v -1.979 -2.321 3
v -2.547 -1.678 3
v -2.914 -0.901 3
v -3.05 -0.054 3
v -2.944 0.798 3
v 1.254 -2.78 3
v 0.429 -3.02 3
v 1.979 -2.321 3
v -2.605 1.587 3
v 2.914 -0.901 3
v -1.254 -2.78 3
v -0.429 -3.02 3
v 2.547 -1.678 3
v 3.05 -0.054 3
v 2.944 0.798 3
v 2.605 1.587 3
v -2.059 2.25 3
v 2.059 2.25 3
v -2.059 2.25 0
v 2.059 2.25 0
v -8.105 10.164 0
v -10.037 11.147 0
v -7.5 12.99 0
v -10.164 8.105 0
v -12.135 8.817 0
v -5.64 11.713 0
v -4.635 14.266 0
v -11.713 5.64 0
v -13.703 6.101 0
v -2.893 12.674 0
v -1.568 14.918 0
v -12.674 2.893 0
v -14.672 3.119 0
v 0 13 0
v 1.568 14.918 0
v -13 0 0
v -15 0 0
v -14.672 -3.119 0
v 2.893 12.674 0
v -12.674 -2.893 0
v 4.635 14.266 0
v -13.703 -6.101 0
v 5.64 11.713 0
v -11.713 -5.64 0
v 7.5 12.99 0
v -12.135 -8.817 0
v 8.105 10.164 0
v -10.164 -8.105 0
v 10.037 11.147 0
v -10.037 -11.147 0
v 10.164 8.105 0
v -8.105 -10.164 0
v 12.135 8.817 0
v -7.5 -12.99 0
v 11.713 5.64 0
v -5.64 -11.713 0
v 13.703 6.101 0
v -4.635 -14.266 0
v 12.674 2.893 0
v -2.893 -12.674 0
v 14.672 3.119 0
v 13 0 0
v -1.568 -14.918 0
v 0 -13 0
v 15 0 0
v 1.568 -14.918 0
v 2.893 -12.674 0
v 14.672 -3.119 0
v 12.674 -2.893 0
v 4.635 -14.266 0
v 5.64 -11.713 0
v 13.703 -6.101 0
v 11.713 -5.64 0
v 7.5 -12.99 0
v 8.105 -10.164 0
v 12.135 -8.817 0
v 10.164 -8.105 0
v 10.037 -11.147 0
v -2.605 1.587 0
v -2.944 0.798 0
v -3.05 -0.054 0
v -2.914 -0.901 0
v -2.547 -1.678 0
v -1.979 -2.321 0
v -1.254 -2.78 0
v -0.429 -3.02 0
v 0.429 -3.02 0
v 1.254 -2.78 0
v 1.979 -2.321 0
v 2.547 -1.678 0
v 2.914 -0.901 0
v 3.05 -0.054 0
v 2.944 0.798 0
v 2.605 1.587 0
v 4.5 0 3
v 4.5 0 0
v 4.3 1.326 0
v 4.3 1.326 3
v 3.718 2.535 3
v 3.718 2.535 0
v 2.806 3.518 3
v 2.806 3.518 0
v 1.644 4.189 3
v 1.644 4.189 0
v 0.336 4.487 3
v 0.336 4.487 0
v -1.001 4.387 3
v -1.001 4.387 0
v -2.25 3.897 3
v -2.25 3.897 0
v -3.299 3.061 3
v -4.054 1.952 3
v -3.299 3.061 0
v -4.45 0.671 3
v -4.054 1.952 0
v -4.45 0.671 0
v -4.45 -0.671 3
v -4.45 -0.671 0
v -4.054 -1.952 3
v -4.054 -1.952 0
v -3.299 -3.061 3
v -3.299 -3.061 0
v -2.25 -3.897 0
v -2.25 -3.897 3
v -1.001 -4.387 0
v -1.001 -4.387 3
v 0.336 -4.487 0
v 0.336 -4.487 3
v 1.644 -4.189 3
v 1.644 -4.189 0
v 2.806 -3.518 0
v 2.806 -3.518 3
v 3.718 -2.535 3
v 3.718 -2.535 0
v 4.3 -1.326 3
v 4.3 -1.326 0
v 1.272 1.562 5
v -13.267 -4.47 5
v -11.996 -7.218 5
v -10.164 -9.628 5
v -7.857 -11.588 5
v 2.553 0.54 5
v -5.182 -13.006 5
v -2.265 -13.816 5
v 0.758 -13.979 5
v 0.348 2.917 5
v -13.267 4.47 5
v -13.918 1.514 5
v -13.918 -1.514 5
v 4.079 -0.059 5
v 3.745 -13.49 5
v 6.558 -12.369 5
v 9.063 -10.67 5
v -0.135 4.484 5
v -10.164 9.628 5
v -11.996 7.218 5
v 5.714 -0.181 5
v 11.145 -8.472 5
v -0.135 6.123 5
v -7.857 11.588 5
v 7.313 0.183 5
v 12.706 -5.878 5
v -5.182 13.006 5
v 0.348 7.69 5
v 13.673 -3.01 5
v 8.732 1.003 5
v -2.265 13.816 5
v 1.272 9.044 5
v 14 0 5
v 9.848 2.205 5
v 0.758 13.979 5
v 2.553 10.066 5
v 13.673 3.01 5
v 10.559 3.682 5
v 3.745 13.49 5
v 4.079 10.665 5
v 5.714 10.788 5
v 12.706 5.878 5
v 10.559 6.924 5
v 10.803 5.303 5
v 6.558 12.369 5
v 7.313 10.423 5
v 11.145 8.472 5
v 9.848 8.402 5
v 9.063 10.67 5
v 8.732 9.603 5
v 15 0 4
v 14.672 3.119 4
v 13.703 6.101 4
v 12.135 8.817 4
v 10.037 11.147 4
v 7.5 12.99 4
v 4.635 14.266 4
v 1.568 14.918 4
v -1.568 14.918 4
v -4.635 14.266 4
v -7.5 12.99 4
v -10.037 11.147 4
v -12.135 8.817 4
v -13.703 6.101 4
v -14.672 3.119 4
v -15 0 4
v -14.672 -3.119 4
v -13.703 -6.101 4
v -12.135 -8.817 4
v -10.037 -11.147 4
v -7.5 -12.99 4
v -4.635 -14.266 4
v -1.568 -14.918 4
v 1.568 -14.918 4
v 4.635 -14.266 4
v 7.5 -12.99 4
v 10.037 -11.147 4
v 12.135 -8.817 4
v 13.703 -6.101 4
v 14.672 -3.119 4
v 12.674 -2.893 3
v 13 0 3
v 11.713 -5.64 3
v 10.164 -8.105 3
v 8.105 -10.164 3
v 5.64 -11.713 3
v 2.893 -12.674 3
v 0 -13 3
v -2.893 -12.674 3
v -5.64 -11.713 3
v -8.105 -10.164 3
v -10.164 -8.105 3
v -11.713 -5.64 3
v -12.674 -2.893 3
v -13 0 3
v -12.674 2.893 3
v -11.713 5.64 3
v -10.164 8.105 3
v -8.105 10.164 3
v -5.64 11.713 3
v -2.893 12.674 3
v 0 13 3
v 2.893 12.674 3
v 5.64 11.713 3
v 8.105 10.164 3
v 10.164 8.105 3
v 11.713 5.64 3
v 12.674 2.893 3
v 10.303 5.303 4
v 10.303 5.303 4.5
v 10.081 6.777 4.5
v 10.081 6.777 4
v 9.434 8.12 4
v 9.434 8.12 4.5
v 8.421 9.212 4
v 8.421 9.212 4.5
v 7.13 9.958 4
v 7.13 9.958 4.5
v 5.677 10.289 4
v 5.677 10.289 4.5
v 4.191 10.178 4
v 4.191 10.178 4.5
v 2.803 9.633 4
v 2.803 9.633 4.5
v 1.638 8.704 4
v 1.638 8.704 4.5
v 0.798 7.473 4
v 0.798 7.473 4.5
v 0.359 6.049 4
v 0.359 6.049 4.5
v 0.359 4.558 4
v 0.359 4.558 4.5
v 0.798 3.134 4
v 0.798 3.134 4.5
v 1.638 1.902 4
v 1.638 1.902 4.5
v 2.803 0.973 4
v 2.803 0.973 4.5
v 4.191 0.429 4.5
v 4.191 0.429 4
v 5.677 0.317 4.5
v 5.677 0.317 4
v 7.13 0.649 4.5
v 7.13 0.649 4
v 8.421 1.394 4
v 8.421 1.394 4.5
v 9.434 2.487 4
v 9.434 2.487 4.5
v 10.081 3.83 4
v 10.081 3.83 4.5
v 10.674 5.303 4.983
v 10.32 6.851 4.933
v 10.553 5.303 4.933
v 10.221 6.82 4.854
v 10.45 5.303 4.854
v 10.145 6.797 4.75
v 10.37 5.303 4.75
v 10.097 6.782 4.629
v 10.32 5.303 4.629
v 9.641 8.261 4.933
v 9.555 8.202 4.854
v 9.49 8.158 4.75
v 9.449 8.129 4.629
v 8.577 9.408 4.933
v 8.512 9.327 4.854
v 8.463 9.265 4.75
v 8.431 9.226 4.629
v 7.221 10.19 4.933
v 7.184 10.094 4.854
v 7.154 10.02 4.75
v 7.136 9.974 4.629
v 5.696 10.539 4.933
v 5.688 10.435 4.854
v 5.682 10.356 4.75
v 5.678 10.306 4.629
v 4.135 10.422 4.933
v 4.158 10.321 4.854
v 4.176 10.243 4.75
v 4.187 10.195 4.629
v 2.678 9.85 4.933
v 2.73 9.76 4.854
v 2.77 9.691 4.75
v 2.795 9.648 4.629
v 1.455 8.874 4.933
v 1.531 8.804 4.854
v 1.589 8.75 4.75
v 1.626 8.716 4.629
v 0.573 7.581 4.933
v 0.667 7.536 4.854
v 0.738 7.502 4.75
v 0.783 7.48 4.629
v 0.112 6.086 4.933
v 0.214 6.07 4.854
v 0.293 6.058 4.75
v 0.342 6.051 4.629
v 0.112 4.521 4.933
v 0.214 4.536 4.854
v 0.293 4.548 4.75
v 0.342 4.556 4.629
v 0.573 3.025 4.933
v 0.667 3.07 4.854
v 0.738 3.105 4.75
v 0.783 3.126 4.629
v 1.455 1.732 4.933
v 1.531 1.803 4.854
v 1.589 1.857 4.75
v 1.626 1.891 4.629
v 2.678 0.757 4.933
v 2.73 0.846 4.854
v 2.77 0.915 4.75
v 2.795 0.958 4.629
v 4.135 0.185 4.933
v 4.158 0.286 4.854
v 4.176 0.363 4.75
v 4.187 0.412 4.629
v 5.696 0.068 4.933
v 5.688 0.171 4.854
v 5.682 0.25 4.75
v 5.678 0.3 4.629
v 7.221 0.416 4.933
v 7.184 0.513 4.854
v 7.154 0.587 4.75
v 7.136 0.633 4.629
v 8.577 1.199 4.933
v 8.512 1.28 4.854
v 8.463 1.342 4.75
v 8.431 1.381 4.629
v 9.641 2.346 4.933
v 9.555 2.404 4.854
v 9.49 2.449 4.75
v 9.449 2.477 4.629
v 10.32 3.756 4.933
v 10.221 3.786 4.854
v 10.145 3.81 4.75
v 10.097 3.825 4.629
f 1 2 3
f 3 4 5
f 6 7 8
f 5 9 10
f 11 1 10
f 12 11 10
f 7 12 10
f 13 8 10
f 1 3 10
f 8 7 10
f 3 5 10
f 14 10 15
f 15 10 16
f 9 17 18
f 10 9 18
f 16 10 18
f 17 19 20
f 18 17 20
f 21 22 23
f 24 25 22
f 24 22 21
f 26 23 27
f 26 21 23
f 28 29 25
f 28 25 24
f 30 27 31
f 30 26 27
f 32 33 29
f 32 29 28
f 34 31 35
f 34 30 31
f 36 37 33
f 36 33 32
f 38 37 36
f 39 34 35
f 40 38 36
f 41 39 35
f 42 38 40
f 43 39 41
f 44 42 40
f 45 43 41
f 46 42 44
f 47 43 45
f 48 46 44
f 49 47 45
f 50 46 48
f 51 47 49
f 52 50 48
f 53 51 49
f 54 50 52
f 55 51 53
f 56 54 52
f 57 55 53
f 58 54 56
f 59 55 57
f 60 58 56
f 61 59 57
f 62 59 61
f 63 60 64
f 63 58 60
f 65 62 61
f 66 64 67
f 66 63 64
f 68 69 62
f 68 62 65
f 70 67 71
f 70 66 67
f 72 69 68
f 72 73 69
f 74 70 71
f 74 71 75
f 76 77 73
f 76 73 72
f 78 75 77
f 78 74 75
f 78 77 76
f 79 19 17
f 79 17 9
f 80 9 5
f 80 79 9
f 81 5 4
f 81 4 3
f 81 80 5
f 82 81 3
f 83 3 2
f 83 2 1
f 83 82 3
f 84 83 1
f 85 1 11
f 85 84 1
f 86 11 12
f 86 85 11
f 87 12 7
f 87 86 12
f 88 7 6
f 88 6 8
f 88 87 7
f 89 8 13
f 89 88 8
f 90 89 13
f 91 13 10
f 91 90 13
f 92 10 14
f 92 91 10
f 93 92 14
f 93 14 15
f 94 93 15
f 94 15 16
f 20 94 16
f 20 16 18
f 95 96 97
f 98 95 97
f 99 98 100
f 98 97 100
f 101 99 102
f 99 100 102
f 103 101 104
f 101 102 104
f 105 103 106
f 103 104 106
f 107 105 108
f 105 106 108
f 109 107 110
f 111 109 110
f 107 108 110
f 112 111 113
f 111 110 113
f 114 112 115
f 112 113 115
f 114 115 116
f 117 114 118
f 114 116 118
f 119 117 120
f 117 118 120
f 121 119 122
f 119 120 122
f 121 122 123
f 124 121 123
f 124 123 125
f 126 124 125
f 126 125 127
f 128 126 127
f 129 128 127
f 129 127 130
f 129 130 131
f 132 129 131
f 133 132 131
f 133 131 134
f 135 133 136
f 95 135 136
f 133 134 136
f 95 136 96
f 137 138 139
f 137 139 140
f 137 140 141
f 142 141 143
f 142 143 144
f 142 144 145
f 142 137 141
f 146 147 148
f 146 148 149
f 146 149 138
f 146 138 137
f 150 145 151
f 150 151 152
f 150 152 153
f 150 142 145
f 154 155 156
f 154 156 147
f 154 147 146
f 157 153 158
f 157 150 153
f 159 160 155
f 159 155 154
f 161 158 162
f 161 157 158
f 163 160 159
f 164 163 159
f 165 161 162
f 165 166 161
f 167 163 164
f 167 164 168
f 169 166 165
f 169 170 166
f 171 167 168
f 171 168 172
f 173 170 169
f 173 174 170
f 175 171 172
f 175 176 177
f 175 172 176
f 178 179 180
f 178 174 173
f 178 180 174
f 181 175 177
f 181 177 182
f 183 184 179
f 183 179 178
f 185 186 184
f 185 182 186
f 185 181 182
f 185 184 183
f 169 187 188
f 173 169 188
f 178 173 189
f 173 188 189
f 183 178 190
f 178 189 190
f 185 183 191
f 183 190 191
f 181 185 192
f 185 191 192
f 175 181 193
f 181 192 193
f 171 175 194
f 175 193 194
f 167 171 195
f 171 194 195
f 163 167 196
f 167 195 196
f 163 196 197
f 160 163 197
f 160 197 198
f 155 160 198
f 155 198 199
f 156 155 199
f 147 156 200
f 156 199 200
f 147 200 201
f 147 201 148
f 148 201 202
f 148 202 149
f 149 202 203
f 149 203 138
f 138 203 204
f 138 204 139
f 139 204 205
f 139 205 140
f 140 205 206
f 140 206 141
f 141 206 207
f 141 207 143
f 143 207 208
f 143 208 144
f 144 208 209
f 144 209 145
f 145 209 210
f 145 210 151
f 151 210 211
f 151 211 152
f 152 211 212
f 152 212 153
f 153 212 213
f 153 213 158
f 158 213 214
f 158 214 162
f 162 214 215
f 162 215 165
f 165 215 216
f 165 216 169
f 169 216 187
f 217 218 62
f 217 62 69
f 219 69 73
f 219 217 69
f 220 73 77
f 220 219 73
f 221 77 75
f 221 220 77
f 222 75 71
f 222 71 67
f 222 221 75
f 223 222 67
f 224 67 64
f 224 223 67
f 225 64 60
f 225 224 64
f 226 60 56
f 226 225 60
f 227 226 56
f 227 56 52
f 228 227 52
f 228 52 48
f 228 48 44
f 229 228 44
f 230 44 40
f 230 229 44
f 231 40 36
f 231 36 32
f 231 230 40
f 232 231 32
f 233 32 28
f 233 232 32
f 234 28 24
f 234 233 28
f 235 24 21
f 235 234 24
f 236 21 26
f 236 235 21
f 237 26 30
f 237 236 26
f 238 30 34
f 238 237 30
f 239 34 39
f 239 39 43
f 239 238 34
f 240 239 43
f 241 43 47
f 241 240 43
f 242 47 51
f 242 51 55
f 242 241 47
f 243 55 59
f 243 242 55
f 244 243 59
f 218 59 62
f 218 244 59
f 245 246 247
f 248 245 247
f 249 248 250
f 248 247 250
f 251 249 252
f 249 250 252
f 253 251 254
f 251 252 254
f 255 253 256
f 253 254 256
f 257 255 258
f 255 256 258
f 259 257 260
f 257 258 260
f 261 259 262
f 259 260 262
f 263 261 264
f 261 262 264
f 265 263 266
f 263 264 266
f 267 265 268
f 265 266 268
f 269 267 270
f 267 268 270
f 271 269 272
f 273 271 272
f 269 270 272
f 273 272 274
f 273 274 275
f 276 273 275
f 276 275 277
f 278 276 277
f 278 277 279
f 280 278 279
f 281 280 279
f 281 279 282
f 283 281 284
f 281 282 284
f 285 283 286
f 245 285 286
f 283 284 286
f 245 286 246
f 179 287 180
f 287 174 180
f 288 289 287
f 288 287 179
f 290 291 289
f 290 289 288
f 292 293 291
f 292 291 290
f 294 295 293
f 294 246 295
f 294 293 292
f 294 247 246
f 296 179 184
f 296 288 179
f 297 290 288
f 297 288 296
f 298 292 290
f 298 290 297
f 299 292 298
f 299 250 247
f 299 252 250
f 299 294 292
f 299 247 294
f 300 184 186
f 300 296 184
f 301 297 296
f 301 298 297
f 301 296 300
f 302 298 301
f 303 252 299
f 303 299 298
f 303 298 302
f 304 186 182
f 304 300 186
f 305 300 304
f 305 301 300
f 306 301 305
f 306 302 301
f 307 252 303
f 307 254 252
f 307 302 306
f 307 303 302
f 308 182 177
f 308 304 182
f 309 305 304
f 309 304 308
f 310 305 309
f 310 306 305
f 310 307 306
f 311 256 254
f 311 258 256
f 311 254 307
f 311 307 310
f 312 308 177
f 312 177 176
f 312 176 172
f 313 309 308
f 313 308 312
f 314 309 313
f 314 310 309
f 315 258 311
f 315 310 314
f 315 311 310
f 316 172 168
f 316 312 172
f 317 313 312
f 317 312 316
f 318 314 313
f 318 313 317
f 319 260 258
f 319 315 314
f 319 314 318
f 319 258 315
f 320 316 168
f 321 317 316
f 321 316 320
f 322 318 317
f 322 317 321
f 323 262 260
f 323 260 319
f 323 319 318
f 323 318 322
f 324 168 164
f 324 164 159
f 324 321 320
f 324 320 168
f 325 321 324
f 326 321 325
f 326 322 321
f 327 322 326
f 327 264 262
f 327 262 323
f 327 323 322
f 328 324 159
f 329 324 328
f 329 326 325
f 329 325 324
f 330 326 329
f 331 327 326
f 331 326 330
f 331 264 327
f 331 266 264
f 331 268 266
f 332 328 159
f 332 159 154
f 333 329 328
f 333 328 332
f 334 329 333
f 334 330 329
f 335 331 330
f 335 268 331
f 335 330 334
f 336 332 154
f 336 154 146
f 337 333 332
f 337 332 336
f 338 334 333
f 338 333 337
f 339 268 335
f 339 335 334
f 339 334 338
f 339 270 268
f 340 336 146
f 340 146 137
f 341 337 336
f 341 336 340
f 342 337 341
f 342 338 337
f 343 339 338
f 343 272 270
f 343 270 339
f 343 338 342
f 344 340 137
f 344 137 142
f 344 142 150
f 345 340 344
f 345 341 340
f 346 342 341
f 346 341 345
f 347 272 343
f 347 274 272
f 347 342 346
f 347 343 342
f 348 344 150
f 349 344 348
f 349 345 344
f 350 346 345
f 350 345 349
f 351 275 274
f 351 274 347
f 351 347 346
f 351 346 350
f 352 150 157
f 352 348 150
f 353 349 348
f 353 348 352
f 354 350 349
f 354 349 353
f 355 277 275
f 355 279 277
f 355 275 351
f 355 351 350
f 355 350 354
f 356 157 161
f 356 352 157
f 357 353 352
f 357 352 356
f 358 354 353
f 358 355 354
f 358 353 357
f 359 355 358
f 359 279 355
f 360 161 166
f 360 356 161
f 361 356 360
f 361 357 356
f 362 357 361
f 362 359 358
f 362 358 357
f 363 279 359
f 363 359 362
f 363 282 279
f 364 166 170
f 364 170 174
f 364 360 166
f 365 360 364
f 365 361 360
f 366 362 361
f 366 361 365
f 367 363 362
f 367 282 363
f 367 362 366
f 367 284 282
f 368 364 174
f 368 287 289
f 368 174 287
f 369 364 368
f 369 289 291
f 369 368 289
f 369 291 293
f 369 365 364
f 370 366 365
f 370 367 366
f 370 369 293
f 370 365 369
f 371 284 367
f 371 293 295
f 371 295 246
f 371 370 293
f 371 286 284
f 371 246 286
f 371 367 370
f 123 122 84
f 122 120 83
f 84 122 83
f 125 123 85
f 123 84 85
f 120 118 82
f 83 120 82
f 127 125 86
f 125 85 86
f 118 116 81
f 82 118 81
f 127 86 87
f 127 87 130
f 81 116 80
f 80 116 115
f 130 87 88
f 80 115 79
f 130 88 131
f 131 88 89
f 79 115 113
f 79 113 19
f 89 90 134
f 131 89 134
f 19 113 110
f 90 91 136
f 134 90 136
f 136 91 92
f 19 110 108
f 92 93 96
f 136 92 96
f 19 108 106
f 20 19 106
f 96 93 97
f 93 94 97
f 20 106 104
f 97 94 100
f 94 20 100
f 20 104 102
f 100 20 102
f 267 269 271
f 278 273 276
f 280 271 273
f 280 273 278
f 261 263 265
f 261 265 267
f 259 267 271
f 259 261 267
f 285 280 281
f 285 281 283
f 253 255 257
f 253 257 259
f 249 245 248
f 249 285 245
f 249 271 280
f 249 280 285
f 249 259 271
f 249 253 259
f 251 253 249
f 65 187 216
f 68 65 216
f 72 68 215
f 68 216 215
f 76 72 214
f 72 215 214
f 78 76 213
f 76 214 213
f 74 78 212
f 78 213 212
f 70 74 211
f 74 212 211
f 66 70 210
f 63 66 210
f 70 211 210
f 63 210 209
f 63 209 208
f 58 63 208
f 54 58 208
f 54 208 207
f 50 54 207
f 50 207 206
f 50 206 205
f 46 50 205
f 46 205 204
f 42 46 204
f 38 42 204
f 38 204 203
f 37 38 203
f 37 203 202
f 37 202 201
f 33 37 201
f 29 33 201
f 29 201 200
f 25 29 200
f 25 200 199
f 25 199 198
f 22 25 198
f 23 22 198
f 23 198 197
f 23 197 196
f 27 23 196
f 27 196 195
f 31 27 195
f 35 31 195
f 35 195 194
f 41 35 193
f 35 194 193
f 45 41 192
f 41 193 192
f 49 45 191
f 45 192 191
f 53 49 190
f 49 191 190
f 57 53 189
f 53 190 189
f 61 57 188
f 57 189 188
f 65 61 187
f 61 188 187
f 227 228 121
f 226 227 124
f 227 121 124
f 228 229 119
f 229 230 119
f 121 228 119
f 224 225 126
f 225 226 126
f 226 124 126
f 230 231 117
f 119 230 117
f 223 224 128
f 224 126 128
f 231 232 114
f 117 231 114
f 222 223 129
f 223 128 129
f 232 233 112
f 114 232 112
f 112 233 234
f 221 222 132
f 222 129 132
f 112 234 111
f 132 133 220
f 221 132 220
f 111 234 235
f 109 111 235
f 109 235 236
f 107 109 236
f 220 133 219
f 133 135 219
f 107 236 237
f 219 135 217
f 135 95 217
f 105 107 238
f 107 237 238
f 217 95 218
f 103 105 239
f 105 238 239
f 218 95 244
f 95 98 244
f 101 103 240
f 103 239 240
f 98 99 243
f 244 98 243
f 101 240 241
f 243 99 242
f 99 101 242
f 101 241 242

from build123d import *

# Parameters (mm, degrees)
SKETCH_R      = 4.5
PAD_DEPTH     = 3
SKETCH001_R   = 15
PAD001_DEPTH  = 2
SKETCH002_R   = 15
SKETCH002_R_2 = 13
PAD002_DEPTH  = 3
SKETCH003_R   = 5
POCKET_DEPTH  = 1
FILLET_R      = 0.5
CHAMFER_SIZE  = 1


with BuildPart() as part:
    # Sketch → Pad (new body)
    with BuildSketch(Plane.XY):
        Circle(SKETCH_R)
        with BuildLine():
            ThreePointArc((-2.059126, 2.25), (0, -3.05), (2.059126, 2.25))
            Line((-2.059126, 2.25), (2.059126, 2.25))
        make_face(mode=Mode.SUBTRACT)
    extrude(amount=PAD_DEPTH)

    # Sketch001 (on Face5 of Pad) → Pad001 (join)
    with BuildSketch(Plane.XY.offset(3)):
        Circle(SKETCH001_R)
    extrude(amount=PAD001_DEPTH)

    # Sketch002 (on Face2 of Pad001) → Pad002 (join)
    with BuildSketch(Plane(origin=(0, 0, 3), x_dir=(1, 0, 0), z_dir=(0, 0, -1))):
        Circle(SKETCH002_R)
        Circle(SKETCH002_R_2, mode=Mode.SUBTRACT)
    extrude(amount=PAD002_DEPTH)

    # Sketch003 (on Face3 of Pad002) → Pocket (cut)
    with BuildSketch(Plane.XY.offset(5)):
        with Locations((5.303301, 5.303301)):
            Circle(SKETCH003_R)
    extrude(amount=-POCKET_DEPTH, mode=Mode.SUBTRACT)

    # Fillet
    fillet_edges = [part.edges().sort_by_distance(p)[0] for p in [
        (0.303301, 5.303301, 5),
    ]]
    fillet(fillet_edges, radius=FILLET_R)

    # Chamfer
    chamfer_edges = [part.edges().sort_by_distance(p)[0] for p in [
        (-15, 0, 5),
    ]]
    chamfer(chamfer_edges, length=CHAMFER_SIZE)


solid = part.part
